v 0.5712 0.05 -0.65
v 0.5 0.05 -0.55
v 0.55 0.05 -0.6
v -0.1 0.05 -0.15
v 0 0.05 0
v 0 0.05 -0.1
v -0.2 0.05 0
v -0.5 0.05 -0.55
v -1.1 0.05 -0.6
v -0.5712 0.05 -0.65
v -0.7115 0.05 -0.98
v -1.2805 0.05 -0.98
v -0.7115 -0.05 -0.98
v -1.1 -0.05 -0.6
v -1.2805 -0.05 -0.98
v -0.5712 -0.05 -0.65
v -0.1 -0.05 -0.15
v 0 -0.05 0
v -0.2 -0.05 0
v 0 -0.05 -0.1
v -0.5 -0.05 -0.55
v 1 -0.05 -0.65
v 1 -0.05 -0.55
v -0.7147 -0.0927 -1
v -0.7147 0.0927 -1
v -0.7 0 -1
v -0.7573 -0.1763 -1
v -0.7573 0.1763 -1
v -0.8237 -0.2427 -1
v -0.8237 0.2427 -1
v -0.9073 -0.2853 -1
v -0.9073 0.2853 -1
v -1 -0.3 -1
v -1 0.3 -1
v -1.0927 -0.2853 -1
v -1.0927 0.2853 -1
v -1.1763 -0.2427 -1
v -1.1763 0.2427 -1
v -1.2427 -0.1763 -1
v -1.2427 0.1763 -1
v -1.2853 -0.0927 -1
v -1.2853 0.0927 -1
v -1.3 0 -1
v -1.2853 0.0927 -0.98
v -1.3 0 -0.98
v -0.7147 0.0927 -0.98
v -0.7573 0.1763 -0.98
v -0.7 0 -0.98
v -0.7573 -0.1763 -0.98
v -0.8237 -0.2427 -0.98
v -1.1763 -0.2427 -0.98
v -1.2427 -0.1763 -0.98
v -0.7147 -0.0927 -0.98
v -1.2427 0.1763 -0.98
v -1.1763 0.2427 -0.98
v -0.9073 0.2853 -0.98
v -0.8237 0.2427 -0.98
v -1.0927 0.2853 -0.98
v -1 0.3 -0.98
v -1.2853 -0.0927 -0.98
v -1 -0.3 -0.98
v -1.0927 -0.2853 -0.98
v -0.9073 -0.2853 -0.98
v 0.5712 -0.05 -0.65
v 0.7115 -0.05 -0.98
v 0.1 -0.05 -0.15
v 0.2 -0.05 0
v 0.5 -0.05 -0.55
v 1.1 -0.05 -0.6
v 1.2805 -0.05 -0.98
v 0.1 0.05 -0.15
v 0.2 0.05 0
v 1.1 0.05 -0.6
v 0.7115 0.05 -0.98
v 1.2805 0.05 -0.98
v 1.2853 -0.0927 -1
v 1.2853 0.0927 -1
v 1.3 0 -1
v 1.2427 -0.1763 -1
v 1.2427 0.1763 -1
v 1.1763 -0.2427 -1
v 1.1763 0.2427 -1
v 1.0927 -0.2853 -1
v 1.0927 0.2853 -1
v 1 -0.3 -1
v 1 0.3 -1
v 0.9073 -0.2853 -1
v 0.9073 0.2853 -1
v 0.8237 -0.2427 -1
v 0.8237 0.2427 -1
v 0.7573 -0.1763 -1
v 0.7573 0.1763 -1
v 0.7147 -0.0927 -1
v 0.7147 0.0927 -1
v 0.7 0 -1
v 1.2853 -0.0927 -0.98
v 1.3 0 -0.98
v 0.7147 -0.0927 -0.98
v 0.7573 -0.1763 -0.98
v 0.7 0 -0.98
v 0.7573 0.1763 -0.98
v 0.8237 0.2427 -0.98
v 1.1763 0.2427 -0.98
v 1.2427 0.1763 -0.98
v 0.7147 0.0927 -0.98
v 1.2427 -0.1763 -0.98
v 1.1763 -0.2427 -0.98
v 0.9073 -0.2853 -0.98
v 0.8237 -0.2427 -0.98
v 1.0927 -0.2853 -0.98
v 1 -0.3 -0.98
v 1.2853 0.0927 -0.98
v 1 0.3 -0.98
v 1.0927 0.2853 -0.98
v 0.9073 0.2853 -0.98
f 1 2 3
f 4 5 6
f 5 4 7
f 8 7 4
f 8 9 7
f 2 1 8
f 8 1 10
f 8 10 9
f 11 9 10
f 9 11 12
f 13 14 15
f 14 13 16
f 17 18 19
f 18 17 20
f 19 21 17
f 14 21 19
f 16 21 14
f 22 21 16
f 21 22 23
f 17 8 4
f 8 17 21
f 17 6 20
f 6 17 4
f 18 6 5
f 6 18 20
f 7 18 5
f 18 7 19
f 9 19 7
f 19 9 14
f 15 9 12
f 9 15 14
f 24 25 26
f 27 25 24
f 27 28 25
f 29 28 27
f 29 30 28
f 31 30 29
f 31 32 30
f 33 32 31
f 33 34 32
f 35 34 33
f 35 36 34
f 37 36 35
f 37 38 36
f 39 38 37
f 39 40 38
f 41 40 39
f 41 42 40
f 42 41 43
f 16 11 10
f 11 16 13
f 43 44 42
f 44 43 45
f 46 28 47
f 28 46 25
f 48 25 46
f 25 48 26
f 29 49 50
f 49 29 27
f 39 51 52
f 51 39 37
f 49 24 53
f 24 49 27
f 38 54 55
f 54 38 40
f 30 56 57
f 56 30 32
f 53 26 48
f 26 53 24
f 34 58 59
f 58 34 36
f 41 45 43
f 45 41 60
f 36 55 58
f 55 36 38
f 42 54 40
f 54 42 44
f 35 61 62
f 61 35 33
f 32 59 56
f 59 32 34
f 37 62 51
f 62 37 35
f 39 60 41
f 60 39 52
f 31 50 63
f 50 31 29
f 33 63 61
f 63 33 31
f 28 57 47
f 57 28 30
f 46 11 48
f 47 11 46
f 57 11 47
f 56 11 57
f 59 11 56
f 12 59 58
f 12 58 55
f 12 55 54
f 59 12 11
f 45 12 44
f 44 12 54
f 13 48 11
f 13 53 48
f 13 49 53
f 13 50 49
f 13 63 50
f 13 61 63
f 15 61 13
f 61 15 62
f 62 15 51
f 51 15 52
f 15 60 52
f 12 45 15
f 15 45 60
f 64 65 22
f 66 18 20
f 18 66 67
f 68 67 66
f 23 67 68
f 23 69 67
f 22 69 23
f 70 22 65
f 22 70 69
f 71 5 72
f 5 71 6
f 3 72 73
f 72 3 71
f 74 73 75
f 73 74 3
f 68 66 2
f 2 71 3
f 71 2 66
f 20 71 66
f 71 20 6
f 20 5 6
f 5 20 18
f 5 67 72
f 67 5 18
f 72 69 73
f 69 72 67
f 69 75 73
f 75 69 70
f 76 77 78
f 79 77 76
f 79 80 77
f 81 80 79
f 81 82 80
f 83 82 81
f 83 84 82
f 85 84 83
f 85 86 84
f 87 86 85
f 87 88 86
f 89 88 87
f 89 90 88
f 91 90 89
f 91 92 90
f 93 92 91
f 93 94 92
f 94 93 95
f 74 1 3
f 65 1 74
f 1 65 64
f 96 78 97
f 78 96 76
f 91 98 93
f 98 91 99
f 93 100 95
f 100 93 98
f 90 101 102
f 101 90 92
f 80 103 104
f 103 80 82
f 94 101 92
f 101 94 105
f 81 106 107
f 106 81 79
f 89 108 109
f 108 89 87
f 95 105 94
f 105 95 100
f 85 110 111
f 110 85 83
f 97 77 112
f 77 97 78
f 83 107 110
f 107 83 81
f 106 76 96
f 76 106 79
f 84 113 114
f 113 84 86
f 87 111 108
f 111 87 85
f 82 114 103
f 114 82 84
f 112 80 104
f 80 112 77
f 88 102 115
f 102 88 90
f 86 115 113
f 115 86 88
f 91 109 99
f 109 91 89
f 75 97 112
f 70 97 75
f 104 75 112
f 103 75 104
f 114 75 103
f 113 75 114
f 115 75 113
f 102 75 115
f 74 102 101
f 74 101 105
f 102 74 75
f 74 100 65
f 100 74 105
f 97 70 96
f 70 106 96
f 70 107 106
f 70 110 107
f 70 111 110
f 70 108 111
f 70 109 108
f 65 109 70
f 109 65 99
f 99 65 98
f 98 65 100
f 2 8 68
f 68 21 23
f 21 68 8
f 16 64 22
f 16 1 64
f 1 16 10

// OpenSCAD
//----------------------------------------------
// Freeform Support bridge double
//----------------------------------------------
$fn=20;

translate([-0.5,-0.5,-1.0]) bridge();

module bridge(){
    union() {
       translate([-0.1,0,0.0]) pilar();
       translate([1.1,1,0.0]) rotate([0, 0, 180]) pilar();
       translate([0.5,0.5,0.4]) cube([2,0.1,0.1],true);
    }
}
module pilar(){
union() {
    translate([0.5,0.55,0.0]) rotate([90, 0, 0]) {
			linear_extrude(height=0.1) {
				polygon(points=[[-0.62,0],[-1.19,0],[-1,0.4],[-0.1,1],[0.1,1],[0.1,0.9],[0,0.85],[-0.45,0.4]], convexity=1);
			}
		}
    translate([-0.4,0.5,0.0]) cylinder ( h = 0.02, r = 0.3, center = false);
}
}
